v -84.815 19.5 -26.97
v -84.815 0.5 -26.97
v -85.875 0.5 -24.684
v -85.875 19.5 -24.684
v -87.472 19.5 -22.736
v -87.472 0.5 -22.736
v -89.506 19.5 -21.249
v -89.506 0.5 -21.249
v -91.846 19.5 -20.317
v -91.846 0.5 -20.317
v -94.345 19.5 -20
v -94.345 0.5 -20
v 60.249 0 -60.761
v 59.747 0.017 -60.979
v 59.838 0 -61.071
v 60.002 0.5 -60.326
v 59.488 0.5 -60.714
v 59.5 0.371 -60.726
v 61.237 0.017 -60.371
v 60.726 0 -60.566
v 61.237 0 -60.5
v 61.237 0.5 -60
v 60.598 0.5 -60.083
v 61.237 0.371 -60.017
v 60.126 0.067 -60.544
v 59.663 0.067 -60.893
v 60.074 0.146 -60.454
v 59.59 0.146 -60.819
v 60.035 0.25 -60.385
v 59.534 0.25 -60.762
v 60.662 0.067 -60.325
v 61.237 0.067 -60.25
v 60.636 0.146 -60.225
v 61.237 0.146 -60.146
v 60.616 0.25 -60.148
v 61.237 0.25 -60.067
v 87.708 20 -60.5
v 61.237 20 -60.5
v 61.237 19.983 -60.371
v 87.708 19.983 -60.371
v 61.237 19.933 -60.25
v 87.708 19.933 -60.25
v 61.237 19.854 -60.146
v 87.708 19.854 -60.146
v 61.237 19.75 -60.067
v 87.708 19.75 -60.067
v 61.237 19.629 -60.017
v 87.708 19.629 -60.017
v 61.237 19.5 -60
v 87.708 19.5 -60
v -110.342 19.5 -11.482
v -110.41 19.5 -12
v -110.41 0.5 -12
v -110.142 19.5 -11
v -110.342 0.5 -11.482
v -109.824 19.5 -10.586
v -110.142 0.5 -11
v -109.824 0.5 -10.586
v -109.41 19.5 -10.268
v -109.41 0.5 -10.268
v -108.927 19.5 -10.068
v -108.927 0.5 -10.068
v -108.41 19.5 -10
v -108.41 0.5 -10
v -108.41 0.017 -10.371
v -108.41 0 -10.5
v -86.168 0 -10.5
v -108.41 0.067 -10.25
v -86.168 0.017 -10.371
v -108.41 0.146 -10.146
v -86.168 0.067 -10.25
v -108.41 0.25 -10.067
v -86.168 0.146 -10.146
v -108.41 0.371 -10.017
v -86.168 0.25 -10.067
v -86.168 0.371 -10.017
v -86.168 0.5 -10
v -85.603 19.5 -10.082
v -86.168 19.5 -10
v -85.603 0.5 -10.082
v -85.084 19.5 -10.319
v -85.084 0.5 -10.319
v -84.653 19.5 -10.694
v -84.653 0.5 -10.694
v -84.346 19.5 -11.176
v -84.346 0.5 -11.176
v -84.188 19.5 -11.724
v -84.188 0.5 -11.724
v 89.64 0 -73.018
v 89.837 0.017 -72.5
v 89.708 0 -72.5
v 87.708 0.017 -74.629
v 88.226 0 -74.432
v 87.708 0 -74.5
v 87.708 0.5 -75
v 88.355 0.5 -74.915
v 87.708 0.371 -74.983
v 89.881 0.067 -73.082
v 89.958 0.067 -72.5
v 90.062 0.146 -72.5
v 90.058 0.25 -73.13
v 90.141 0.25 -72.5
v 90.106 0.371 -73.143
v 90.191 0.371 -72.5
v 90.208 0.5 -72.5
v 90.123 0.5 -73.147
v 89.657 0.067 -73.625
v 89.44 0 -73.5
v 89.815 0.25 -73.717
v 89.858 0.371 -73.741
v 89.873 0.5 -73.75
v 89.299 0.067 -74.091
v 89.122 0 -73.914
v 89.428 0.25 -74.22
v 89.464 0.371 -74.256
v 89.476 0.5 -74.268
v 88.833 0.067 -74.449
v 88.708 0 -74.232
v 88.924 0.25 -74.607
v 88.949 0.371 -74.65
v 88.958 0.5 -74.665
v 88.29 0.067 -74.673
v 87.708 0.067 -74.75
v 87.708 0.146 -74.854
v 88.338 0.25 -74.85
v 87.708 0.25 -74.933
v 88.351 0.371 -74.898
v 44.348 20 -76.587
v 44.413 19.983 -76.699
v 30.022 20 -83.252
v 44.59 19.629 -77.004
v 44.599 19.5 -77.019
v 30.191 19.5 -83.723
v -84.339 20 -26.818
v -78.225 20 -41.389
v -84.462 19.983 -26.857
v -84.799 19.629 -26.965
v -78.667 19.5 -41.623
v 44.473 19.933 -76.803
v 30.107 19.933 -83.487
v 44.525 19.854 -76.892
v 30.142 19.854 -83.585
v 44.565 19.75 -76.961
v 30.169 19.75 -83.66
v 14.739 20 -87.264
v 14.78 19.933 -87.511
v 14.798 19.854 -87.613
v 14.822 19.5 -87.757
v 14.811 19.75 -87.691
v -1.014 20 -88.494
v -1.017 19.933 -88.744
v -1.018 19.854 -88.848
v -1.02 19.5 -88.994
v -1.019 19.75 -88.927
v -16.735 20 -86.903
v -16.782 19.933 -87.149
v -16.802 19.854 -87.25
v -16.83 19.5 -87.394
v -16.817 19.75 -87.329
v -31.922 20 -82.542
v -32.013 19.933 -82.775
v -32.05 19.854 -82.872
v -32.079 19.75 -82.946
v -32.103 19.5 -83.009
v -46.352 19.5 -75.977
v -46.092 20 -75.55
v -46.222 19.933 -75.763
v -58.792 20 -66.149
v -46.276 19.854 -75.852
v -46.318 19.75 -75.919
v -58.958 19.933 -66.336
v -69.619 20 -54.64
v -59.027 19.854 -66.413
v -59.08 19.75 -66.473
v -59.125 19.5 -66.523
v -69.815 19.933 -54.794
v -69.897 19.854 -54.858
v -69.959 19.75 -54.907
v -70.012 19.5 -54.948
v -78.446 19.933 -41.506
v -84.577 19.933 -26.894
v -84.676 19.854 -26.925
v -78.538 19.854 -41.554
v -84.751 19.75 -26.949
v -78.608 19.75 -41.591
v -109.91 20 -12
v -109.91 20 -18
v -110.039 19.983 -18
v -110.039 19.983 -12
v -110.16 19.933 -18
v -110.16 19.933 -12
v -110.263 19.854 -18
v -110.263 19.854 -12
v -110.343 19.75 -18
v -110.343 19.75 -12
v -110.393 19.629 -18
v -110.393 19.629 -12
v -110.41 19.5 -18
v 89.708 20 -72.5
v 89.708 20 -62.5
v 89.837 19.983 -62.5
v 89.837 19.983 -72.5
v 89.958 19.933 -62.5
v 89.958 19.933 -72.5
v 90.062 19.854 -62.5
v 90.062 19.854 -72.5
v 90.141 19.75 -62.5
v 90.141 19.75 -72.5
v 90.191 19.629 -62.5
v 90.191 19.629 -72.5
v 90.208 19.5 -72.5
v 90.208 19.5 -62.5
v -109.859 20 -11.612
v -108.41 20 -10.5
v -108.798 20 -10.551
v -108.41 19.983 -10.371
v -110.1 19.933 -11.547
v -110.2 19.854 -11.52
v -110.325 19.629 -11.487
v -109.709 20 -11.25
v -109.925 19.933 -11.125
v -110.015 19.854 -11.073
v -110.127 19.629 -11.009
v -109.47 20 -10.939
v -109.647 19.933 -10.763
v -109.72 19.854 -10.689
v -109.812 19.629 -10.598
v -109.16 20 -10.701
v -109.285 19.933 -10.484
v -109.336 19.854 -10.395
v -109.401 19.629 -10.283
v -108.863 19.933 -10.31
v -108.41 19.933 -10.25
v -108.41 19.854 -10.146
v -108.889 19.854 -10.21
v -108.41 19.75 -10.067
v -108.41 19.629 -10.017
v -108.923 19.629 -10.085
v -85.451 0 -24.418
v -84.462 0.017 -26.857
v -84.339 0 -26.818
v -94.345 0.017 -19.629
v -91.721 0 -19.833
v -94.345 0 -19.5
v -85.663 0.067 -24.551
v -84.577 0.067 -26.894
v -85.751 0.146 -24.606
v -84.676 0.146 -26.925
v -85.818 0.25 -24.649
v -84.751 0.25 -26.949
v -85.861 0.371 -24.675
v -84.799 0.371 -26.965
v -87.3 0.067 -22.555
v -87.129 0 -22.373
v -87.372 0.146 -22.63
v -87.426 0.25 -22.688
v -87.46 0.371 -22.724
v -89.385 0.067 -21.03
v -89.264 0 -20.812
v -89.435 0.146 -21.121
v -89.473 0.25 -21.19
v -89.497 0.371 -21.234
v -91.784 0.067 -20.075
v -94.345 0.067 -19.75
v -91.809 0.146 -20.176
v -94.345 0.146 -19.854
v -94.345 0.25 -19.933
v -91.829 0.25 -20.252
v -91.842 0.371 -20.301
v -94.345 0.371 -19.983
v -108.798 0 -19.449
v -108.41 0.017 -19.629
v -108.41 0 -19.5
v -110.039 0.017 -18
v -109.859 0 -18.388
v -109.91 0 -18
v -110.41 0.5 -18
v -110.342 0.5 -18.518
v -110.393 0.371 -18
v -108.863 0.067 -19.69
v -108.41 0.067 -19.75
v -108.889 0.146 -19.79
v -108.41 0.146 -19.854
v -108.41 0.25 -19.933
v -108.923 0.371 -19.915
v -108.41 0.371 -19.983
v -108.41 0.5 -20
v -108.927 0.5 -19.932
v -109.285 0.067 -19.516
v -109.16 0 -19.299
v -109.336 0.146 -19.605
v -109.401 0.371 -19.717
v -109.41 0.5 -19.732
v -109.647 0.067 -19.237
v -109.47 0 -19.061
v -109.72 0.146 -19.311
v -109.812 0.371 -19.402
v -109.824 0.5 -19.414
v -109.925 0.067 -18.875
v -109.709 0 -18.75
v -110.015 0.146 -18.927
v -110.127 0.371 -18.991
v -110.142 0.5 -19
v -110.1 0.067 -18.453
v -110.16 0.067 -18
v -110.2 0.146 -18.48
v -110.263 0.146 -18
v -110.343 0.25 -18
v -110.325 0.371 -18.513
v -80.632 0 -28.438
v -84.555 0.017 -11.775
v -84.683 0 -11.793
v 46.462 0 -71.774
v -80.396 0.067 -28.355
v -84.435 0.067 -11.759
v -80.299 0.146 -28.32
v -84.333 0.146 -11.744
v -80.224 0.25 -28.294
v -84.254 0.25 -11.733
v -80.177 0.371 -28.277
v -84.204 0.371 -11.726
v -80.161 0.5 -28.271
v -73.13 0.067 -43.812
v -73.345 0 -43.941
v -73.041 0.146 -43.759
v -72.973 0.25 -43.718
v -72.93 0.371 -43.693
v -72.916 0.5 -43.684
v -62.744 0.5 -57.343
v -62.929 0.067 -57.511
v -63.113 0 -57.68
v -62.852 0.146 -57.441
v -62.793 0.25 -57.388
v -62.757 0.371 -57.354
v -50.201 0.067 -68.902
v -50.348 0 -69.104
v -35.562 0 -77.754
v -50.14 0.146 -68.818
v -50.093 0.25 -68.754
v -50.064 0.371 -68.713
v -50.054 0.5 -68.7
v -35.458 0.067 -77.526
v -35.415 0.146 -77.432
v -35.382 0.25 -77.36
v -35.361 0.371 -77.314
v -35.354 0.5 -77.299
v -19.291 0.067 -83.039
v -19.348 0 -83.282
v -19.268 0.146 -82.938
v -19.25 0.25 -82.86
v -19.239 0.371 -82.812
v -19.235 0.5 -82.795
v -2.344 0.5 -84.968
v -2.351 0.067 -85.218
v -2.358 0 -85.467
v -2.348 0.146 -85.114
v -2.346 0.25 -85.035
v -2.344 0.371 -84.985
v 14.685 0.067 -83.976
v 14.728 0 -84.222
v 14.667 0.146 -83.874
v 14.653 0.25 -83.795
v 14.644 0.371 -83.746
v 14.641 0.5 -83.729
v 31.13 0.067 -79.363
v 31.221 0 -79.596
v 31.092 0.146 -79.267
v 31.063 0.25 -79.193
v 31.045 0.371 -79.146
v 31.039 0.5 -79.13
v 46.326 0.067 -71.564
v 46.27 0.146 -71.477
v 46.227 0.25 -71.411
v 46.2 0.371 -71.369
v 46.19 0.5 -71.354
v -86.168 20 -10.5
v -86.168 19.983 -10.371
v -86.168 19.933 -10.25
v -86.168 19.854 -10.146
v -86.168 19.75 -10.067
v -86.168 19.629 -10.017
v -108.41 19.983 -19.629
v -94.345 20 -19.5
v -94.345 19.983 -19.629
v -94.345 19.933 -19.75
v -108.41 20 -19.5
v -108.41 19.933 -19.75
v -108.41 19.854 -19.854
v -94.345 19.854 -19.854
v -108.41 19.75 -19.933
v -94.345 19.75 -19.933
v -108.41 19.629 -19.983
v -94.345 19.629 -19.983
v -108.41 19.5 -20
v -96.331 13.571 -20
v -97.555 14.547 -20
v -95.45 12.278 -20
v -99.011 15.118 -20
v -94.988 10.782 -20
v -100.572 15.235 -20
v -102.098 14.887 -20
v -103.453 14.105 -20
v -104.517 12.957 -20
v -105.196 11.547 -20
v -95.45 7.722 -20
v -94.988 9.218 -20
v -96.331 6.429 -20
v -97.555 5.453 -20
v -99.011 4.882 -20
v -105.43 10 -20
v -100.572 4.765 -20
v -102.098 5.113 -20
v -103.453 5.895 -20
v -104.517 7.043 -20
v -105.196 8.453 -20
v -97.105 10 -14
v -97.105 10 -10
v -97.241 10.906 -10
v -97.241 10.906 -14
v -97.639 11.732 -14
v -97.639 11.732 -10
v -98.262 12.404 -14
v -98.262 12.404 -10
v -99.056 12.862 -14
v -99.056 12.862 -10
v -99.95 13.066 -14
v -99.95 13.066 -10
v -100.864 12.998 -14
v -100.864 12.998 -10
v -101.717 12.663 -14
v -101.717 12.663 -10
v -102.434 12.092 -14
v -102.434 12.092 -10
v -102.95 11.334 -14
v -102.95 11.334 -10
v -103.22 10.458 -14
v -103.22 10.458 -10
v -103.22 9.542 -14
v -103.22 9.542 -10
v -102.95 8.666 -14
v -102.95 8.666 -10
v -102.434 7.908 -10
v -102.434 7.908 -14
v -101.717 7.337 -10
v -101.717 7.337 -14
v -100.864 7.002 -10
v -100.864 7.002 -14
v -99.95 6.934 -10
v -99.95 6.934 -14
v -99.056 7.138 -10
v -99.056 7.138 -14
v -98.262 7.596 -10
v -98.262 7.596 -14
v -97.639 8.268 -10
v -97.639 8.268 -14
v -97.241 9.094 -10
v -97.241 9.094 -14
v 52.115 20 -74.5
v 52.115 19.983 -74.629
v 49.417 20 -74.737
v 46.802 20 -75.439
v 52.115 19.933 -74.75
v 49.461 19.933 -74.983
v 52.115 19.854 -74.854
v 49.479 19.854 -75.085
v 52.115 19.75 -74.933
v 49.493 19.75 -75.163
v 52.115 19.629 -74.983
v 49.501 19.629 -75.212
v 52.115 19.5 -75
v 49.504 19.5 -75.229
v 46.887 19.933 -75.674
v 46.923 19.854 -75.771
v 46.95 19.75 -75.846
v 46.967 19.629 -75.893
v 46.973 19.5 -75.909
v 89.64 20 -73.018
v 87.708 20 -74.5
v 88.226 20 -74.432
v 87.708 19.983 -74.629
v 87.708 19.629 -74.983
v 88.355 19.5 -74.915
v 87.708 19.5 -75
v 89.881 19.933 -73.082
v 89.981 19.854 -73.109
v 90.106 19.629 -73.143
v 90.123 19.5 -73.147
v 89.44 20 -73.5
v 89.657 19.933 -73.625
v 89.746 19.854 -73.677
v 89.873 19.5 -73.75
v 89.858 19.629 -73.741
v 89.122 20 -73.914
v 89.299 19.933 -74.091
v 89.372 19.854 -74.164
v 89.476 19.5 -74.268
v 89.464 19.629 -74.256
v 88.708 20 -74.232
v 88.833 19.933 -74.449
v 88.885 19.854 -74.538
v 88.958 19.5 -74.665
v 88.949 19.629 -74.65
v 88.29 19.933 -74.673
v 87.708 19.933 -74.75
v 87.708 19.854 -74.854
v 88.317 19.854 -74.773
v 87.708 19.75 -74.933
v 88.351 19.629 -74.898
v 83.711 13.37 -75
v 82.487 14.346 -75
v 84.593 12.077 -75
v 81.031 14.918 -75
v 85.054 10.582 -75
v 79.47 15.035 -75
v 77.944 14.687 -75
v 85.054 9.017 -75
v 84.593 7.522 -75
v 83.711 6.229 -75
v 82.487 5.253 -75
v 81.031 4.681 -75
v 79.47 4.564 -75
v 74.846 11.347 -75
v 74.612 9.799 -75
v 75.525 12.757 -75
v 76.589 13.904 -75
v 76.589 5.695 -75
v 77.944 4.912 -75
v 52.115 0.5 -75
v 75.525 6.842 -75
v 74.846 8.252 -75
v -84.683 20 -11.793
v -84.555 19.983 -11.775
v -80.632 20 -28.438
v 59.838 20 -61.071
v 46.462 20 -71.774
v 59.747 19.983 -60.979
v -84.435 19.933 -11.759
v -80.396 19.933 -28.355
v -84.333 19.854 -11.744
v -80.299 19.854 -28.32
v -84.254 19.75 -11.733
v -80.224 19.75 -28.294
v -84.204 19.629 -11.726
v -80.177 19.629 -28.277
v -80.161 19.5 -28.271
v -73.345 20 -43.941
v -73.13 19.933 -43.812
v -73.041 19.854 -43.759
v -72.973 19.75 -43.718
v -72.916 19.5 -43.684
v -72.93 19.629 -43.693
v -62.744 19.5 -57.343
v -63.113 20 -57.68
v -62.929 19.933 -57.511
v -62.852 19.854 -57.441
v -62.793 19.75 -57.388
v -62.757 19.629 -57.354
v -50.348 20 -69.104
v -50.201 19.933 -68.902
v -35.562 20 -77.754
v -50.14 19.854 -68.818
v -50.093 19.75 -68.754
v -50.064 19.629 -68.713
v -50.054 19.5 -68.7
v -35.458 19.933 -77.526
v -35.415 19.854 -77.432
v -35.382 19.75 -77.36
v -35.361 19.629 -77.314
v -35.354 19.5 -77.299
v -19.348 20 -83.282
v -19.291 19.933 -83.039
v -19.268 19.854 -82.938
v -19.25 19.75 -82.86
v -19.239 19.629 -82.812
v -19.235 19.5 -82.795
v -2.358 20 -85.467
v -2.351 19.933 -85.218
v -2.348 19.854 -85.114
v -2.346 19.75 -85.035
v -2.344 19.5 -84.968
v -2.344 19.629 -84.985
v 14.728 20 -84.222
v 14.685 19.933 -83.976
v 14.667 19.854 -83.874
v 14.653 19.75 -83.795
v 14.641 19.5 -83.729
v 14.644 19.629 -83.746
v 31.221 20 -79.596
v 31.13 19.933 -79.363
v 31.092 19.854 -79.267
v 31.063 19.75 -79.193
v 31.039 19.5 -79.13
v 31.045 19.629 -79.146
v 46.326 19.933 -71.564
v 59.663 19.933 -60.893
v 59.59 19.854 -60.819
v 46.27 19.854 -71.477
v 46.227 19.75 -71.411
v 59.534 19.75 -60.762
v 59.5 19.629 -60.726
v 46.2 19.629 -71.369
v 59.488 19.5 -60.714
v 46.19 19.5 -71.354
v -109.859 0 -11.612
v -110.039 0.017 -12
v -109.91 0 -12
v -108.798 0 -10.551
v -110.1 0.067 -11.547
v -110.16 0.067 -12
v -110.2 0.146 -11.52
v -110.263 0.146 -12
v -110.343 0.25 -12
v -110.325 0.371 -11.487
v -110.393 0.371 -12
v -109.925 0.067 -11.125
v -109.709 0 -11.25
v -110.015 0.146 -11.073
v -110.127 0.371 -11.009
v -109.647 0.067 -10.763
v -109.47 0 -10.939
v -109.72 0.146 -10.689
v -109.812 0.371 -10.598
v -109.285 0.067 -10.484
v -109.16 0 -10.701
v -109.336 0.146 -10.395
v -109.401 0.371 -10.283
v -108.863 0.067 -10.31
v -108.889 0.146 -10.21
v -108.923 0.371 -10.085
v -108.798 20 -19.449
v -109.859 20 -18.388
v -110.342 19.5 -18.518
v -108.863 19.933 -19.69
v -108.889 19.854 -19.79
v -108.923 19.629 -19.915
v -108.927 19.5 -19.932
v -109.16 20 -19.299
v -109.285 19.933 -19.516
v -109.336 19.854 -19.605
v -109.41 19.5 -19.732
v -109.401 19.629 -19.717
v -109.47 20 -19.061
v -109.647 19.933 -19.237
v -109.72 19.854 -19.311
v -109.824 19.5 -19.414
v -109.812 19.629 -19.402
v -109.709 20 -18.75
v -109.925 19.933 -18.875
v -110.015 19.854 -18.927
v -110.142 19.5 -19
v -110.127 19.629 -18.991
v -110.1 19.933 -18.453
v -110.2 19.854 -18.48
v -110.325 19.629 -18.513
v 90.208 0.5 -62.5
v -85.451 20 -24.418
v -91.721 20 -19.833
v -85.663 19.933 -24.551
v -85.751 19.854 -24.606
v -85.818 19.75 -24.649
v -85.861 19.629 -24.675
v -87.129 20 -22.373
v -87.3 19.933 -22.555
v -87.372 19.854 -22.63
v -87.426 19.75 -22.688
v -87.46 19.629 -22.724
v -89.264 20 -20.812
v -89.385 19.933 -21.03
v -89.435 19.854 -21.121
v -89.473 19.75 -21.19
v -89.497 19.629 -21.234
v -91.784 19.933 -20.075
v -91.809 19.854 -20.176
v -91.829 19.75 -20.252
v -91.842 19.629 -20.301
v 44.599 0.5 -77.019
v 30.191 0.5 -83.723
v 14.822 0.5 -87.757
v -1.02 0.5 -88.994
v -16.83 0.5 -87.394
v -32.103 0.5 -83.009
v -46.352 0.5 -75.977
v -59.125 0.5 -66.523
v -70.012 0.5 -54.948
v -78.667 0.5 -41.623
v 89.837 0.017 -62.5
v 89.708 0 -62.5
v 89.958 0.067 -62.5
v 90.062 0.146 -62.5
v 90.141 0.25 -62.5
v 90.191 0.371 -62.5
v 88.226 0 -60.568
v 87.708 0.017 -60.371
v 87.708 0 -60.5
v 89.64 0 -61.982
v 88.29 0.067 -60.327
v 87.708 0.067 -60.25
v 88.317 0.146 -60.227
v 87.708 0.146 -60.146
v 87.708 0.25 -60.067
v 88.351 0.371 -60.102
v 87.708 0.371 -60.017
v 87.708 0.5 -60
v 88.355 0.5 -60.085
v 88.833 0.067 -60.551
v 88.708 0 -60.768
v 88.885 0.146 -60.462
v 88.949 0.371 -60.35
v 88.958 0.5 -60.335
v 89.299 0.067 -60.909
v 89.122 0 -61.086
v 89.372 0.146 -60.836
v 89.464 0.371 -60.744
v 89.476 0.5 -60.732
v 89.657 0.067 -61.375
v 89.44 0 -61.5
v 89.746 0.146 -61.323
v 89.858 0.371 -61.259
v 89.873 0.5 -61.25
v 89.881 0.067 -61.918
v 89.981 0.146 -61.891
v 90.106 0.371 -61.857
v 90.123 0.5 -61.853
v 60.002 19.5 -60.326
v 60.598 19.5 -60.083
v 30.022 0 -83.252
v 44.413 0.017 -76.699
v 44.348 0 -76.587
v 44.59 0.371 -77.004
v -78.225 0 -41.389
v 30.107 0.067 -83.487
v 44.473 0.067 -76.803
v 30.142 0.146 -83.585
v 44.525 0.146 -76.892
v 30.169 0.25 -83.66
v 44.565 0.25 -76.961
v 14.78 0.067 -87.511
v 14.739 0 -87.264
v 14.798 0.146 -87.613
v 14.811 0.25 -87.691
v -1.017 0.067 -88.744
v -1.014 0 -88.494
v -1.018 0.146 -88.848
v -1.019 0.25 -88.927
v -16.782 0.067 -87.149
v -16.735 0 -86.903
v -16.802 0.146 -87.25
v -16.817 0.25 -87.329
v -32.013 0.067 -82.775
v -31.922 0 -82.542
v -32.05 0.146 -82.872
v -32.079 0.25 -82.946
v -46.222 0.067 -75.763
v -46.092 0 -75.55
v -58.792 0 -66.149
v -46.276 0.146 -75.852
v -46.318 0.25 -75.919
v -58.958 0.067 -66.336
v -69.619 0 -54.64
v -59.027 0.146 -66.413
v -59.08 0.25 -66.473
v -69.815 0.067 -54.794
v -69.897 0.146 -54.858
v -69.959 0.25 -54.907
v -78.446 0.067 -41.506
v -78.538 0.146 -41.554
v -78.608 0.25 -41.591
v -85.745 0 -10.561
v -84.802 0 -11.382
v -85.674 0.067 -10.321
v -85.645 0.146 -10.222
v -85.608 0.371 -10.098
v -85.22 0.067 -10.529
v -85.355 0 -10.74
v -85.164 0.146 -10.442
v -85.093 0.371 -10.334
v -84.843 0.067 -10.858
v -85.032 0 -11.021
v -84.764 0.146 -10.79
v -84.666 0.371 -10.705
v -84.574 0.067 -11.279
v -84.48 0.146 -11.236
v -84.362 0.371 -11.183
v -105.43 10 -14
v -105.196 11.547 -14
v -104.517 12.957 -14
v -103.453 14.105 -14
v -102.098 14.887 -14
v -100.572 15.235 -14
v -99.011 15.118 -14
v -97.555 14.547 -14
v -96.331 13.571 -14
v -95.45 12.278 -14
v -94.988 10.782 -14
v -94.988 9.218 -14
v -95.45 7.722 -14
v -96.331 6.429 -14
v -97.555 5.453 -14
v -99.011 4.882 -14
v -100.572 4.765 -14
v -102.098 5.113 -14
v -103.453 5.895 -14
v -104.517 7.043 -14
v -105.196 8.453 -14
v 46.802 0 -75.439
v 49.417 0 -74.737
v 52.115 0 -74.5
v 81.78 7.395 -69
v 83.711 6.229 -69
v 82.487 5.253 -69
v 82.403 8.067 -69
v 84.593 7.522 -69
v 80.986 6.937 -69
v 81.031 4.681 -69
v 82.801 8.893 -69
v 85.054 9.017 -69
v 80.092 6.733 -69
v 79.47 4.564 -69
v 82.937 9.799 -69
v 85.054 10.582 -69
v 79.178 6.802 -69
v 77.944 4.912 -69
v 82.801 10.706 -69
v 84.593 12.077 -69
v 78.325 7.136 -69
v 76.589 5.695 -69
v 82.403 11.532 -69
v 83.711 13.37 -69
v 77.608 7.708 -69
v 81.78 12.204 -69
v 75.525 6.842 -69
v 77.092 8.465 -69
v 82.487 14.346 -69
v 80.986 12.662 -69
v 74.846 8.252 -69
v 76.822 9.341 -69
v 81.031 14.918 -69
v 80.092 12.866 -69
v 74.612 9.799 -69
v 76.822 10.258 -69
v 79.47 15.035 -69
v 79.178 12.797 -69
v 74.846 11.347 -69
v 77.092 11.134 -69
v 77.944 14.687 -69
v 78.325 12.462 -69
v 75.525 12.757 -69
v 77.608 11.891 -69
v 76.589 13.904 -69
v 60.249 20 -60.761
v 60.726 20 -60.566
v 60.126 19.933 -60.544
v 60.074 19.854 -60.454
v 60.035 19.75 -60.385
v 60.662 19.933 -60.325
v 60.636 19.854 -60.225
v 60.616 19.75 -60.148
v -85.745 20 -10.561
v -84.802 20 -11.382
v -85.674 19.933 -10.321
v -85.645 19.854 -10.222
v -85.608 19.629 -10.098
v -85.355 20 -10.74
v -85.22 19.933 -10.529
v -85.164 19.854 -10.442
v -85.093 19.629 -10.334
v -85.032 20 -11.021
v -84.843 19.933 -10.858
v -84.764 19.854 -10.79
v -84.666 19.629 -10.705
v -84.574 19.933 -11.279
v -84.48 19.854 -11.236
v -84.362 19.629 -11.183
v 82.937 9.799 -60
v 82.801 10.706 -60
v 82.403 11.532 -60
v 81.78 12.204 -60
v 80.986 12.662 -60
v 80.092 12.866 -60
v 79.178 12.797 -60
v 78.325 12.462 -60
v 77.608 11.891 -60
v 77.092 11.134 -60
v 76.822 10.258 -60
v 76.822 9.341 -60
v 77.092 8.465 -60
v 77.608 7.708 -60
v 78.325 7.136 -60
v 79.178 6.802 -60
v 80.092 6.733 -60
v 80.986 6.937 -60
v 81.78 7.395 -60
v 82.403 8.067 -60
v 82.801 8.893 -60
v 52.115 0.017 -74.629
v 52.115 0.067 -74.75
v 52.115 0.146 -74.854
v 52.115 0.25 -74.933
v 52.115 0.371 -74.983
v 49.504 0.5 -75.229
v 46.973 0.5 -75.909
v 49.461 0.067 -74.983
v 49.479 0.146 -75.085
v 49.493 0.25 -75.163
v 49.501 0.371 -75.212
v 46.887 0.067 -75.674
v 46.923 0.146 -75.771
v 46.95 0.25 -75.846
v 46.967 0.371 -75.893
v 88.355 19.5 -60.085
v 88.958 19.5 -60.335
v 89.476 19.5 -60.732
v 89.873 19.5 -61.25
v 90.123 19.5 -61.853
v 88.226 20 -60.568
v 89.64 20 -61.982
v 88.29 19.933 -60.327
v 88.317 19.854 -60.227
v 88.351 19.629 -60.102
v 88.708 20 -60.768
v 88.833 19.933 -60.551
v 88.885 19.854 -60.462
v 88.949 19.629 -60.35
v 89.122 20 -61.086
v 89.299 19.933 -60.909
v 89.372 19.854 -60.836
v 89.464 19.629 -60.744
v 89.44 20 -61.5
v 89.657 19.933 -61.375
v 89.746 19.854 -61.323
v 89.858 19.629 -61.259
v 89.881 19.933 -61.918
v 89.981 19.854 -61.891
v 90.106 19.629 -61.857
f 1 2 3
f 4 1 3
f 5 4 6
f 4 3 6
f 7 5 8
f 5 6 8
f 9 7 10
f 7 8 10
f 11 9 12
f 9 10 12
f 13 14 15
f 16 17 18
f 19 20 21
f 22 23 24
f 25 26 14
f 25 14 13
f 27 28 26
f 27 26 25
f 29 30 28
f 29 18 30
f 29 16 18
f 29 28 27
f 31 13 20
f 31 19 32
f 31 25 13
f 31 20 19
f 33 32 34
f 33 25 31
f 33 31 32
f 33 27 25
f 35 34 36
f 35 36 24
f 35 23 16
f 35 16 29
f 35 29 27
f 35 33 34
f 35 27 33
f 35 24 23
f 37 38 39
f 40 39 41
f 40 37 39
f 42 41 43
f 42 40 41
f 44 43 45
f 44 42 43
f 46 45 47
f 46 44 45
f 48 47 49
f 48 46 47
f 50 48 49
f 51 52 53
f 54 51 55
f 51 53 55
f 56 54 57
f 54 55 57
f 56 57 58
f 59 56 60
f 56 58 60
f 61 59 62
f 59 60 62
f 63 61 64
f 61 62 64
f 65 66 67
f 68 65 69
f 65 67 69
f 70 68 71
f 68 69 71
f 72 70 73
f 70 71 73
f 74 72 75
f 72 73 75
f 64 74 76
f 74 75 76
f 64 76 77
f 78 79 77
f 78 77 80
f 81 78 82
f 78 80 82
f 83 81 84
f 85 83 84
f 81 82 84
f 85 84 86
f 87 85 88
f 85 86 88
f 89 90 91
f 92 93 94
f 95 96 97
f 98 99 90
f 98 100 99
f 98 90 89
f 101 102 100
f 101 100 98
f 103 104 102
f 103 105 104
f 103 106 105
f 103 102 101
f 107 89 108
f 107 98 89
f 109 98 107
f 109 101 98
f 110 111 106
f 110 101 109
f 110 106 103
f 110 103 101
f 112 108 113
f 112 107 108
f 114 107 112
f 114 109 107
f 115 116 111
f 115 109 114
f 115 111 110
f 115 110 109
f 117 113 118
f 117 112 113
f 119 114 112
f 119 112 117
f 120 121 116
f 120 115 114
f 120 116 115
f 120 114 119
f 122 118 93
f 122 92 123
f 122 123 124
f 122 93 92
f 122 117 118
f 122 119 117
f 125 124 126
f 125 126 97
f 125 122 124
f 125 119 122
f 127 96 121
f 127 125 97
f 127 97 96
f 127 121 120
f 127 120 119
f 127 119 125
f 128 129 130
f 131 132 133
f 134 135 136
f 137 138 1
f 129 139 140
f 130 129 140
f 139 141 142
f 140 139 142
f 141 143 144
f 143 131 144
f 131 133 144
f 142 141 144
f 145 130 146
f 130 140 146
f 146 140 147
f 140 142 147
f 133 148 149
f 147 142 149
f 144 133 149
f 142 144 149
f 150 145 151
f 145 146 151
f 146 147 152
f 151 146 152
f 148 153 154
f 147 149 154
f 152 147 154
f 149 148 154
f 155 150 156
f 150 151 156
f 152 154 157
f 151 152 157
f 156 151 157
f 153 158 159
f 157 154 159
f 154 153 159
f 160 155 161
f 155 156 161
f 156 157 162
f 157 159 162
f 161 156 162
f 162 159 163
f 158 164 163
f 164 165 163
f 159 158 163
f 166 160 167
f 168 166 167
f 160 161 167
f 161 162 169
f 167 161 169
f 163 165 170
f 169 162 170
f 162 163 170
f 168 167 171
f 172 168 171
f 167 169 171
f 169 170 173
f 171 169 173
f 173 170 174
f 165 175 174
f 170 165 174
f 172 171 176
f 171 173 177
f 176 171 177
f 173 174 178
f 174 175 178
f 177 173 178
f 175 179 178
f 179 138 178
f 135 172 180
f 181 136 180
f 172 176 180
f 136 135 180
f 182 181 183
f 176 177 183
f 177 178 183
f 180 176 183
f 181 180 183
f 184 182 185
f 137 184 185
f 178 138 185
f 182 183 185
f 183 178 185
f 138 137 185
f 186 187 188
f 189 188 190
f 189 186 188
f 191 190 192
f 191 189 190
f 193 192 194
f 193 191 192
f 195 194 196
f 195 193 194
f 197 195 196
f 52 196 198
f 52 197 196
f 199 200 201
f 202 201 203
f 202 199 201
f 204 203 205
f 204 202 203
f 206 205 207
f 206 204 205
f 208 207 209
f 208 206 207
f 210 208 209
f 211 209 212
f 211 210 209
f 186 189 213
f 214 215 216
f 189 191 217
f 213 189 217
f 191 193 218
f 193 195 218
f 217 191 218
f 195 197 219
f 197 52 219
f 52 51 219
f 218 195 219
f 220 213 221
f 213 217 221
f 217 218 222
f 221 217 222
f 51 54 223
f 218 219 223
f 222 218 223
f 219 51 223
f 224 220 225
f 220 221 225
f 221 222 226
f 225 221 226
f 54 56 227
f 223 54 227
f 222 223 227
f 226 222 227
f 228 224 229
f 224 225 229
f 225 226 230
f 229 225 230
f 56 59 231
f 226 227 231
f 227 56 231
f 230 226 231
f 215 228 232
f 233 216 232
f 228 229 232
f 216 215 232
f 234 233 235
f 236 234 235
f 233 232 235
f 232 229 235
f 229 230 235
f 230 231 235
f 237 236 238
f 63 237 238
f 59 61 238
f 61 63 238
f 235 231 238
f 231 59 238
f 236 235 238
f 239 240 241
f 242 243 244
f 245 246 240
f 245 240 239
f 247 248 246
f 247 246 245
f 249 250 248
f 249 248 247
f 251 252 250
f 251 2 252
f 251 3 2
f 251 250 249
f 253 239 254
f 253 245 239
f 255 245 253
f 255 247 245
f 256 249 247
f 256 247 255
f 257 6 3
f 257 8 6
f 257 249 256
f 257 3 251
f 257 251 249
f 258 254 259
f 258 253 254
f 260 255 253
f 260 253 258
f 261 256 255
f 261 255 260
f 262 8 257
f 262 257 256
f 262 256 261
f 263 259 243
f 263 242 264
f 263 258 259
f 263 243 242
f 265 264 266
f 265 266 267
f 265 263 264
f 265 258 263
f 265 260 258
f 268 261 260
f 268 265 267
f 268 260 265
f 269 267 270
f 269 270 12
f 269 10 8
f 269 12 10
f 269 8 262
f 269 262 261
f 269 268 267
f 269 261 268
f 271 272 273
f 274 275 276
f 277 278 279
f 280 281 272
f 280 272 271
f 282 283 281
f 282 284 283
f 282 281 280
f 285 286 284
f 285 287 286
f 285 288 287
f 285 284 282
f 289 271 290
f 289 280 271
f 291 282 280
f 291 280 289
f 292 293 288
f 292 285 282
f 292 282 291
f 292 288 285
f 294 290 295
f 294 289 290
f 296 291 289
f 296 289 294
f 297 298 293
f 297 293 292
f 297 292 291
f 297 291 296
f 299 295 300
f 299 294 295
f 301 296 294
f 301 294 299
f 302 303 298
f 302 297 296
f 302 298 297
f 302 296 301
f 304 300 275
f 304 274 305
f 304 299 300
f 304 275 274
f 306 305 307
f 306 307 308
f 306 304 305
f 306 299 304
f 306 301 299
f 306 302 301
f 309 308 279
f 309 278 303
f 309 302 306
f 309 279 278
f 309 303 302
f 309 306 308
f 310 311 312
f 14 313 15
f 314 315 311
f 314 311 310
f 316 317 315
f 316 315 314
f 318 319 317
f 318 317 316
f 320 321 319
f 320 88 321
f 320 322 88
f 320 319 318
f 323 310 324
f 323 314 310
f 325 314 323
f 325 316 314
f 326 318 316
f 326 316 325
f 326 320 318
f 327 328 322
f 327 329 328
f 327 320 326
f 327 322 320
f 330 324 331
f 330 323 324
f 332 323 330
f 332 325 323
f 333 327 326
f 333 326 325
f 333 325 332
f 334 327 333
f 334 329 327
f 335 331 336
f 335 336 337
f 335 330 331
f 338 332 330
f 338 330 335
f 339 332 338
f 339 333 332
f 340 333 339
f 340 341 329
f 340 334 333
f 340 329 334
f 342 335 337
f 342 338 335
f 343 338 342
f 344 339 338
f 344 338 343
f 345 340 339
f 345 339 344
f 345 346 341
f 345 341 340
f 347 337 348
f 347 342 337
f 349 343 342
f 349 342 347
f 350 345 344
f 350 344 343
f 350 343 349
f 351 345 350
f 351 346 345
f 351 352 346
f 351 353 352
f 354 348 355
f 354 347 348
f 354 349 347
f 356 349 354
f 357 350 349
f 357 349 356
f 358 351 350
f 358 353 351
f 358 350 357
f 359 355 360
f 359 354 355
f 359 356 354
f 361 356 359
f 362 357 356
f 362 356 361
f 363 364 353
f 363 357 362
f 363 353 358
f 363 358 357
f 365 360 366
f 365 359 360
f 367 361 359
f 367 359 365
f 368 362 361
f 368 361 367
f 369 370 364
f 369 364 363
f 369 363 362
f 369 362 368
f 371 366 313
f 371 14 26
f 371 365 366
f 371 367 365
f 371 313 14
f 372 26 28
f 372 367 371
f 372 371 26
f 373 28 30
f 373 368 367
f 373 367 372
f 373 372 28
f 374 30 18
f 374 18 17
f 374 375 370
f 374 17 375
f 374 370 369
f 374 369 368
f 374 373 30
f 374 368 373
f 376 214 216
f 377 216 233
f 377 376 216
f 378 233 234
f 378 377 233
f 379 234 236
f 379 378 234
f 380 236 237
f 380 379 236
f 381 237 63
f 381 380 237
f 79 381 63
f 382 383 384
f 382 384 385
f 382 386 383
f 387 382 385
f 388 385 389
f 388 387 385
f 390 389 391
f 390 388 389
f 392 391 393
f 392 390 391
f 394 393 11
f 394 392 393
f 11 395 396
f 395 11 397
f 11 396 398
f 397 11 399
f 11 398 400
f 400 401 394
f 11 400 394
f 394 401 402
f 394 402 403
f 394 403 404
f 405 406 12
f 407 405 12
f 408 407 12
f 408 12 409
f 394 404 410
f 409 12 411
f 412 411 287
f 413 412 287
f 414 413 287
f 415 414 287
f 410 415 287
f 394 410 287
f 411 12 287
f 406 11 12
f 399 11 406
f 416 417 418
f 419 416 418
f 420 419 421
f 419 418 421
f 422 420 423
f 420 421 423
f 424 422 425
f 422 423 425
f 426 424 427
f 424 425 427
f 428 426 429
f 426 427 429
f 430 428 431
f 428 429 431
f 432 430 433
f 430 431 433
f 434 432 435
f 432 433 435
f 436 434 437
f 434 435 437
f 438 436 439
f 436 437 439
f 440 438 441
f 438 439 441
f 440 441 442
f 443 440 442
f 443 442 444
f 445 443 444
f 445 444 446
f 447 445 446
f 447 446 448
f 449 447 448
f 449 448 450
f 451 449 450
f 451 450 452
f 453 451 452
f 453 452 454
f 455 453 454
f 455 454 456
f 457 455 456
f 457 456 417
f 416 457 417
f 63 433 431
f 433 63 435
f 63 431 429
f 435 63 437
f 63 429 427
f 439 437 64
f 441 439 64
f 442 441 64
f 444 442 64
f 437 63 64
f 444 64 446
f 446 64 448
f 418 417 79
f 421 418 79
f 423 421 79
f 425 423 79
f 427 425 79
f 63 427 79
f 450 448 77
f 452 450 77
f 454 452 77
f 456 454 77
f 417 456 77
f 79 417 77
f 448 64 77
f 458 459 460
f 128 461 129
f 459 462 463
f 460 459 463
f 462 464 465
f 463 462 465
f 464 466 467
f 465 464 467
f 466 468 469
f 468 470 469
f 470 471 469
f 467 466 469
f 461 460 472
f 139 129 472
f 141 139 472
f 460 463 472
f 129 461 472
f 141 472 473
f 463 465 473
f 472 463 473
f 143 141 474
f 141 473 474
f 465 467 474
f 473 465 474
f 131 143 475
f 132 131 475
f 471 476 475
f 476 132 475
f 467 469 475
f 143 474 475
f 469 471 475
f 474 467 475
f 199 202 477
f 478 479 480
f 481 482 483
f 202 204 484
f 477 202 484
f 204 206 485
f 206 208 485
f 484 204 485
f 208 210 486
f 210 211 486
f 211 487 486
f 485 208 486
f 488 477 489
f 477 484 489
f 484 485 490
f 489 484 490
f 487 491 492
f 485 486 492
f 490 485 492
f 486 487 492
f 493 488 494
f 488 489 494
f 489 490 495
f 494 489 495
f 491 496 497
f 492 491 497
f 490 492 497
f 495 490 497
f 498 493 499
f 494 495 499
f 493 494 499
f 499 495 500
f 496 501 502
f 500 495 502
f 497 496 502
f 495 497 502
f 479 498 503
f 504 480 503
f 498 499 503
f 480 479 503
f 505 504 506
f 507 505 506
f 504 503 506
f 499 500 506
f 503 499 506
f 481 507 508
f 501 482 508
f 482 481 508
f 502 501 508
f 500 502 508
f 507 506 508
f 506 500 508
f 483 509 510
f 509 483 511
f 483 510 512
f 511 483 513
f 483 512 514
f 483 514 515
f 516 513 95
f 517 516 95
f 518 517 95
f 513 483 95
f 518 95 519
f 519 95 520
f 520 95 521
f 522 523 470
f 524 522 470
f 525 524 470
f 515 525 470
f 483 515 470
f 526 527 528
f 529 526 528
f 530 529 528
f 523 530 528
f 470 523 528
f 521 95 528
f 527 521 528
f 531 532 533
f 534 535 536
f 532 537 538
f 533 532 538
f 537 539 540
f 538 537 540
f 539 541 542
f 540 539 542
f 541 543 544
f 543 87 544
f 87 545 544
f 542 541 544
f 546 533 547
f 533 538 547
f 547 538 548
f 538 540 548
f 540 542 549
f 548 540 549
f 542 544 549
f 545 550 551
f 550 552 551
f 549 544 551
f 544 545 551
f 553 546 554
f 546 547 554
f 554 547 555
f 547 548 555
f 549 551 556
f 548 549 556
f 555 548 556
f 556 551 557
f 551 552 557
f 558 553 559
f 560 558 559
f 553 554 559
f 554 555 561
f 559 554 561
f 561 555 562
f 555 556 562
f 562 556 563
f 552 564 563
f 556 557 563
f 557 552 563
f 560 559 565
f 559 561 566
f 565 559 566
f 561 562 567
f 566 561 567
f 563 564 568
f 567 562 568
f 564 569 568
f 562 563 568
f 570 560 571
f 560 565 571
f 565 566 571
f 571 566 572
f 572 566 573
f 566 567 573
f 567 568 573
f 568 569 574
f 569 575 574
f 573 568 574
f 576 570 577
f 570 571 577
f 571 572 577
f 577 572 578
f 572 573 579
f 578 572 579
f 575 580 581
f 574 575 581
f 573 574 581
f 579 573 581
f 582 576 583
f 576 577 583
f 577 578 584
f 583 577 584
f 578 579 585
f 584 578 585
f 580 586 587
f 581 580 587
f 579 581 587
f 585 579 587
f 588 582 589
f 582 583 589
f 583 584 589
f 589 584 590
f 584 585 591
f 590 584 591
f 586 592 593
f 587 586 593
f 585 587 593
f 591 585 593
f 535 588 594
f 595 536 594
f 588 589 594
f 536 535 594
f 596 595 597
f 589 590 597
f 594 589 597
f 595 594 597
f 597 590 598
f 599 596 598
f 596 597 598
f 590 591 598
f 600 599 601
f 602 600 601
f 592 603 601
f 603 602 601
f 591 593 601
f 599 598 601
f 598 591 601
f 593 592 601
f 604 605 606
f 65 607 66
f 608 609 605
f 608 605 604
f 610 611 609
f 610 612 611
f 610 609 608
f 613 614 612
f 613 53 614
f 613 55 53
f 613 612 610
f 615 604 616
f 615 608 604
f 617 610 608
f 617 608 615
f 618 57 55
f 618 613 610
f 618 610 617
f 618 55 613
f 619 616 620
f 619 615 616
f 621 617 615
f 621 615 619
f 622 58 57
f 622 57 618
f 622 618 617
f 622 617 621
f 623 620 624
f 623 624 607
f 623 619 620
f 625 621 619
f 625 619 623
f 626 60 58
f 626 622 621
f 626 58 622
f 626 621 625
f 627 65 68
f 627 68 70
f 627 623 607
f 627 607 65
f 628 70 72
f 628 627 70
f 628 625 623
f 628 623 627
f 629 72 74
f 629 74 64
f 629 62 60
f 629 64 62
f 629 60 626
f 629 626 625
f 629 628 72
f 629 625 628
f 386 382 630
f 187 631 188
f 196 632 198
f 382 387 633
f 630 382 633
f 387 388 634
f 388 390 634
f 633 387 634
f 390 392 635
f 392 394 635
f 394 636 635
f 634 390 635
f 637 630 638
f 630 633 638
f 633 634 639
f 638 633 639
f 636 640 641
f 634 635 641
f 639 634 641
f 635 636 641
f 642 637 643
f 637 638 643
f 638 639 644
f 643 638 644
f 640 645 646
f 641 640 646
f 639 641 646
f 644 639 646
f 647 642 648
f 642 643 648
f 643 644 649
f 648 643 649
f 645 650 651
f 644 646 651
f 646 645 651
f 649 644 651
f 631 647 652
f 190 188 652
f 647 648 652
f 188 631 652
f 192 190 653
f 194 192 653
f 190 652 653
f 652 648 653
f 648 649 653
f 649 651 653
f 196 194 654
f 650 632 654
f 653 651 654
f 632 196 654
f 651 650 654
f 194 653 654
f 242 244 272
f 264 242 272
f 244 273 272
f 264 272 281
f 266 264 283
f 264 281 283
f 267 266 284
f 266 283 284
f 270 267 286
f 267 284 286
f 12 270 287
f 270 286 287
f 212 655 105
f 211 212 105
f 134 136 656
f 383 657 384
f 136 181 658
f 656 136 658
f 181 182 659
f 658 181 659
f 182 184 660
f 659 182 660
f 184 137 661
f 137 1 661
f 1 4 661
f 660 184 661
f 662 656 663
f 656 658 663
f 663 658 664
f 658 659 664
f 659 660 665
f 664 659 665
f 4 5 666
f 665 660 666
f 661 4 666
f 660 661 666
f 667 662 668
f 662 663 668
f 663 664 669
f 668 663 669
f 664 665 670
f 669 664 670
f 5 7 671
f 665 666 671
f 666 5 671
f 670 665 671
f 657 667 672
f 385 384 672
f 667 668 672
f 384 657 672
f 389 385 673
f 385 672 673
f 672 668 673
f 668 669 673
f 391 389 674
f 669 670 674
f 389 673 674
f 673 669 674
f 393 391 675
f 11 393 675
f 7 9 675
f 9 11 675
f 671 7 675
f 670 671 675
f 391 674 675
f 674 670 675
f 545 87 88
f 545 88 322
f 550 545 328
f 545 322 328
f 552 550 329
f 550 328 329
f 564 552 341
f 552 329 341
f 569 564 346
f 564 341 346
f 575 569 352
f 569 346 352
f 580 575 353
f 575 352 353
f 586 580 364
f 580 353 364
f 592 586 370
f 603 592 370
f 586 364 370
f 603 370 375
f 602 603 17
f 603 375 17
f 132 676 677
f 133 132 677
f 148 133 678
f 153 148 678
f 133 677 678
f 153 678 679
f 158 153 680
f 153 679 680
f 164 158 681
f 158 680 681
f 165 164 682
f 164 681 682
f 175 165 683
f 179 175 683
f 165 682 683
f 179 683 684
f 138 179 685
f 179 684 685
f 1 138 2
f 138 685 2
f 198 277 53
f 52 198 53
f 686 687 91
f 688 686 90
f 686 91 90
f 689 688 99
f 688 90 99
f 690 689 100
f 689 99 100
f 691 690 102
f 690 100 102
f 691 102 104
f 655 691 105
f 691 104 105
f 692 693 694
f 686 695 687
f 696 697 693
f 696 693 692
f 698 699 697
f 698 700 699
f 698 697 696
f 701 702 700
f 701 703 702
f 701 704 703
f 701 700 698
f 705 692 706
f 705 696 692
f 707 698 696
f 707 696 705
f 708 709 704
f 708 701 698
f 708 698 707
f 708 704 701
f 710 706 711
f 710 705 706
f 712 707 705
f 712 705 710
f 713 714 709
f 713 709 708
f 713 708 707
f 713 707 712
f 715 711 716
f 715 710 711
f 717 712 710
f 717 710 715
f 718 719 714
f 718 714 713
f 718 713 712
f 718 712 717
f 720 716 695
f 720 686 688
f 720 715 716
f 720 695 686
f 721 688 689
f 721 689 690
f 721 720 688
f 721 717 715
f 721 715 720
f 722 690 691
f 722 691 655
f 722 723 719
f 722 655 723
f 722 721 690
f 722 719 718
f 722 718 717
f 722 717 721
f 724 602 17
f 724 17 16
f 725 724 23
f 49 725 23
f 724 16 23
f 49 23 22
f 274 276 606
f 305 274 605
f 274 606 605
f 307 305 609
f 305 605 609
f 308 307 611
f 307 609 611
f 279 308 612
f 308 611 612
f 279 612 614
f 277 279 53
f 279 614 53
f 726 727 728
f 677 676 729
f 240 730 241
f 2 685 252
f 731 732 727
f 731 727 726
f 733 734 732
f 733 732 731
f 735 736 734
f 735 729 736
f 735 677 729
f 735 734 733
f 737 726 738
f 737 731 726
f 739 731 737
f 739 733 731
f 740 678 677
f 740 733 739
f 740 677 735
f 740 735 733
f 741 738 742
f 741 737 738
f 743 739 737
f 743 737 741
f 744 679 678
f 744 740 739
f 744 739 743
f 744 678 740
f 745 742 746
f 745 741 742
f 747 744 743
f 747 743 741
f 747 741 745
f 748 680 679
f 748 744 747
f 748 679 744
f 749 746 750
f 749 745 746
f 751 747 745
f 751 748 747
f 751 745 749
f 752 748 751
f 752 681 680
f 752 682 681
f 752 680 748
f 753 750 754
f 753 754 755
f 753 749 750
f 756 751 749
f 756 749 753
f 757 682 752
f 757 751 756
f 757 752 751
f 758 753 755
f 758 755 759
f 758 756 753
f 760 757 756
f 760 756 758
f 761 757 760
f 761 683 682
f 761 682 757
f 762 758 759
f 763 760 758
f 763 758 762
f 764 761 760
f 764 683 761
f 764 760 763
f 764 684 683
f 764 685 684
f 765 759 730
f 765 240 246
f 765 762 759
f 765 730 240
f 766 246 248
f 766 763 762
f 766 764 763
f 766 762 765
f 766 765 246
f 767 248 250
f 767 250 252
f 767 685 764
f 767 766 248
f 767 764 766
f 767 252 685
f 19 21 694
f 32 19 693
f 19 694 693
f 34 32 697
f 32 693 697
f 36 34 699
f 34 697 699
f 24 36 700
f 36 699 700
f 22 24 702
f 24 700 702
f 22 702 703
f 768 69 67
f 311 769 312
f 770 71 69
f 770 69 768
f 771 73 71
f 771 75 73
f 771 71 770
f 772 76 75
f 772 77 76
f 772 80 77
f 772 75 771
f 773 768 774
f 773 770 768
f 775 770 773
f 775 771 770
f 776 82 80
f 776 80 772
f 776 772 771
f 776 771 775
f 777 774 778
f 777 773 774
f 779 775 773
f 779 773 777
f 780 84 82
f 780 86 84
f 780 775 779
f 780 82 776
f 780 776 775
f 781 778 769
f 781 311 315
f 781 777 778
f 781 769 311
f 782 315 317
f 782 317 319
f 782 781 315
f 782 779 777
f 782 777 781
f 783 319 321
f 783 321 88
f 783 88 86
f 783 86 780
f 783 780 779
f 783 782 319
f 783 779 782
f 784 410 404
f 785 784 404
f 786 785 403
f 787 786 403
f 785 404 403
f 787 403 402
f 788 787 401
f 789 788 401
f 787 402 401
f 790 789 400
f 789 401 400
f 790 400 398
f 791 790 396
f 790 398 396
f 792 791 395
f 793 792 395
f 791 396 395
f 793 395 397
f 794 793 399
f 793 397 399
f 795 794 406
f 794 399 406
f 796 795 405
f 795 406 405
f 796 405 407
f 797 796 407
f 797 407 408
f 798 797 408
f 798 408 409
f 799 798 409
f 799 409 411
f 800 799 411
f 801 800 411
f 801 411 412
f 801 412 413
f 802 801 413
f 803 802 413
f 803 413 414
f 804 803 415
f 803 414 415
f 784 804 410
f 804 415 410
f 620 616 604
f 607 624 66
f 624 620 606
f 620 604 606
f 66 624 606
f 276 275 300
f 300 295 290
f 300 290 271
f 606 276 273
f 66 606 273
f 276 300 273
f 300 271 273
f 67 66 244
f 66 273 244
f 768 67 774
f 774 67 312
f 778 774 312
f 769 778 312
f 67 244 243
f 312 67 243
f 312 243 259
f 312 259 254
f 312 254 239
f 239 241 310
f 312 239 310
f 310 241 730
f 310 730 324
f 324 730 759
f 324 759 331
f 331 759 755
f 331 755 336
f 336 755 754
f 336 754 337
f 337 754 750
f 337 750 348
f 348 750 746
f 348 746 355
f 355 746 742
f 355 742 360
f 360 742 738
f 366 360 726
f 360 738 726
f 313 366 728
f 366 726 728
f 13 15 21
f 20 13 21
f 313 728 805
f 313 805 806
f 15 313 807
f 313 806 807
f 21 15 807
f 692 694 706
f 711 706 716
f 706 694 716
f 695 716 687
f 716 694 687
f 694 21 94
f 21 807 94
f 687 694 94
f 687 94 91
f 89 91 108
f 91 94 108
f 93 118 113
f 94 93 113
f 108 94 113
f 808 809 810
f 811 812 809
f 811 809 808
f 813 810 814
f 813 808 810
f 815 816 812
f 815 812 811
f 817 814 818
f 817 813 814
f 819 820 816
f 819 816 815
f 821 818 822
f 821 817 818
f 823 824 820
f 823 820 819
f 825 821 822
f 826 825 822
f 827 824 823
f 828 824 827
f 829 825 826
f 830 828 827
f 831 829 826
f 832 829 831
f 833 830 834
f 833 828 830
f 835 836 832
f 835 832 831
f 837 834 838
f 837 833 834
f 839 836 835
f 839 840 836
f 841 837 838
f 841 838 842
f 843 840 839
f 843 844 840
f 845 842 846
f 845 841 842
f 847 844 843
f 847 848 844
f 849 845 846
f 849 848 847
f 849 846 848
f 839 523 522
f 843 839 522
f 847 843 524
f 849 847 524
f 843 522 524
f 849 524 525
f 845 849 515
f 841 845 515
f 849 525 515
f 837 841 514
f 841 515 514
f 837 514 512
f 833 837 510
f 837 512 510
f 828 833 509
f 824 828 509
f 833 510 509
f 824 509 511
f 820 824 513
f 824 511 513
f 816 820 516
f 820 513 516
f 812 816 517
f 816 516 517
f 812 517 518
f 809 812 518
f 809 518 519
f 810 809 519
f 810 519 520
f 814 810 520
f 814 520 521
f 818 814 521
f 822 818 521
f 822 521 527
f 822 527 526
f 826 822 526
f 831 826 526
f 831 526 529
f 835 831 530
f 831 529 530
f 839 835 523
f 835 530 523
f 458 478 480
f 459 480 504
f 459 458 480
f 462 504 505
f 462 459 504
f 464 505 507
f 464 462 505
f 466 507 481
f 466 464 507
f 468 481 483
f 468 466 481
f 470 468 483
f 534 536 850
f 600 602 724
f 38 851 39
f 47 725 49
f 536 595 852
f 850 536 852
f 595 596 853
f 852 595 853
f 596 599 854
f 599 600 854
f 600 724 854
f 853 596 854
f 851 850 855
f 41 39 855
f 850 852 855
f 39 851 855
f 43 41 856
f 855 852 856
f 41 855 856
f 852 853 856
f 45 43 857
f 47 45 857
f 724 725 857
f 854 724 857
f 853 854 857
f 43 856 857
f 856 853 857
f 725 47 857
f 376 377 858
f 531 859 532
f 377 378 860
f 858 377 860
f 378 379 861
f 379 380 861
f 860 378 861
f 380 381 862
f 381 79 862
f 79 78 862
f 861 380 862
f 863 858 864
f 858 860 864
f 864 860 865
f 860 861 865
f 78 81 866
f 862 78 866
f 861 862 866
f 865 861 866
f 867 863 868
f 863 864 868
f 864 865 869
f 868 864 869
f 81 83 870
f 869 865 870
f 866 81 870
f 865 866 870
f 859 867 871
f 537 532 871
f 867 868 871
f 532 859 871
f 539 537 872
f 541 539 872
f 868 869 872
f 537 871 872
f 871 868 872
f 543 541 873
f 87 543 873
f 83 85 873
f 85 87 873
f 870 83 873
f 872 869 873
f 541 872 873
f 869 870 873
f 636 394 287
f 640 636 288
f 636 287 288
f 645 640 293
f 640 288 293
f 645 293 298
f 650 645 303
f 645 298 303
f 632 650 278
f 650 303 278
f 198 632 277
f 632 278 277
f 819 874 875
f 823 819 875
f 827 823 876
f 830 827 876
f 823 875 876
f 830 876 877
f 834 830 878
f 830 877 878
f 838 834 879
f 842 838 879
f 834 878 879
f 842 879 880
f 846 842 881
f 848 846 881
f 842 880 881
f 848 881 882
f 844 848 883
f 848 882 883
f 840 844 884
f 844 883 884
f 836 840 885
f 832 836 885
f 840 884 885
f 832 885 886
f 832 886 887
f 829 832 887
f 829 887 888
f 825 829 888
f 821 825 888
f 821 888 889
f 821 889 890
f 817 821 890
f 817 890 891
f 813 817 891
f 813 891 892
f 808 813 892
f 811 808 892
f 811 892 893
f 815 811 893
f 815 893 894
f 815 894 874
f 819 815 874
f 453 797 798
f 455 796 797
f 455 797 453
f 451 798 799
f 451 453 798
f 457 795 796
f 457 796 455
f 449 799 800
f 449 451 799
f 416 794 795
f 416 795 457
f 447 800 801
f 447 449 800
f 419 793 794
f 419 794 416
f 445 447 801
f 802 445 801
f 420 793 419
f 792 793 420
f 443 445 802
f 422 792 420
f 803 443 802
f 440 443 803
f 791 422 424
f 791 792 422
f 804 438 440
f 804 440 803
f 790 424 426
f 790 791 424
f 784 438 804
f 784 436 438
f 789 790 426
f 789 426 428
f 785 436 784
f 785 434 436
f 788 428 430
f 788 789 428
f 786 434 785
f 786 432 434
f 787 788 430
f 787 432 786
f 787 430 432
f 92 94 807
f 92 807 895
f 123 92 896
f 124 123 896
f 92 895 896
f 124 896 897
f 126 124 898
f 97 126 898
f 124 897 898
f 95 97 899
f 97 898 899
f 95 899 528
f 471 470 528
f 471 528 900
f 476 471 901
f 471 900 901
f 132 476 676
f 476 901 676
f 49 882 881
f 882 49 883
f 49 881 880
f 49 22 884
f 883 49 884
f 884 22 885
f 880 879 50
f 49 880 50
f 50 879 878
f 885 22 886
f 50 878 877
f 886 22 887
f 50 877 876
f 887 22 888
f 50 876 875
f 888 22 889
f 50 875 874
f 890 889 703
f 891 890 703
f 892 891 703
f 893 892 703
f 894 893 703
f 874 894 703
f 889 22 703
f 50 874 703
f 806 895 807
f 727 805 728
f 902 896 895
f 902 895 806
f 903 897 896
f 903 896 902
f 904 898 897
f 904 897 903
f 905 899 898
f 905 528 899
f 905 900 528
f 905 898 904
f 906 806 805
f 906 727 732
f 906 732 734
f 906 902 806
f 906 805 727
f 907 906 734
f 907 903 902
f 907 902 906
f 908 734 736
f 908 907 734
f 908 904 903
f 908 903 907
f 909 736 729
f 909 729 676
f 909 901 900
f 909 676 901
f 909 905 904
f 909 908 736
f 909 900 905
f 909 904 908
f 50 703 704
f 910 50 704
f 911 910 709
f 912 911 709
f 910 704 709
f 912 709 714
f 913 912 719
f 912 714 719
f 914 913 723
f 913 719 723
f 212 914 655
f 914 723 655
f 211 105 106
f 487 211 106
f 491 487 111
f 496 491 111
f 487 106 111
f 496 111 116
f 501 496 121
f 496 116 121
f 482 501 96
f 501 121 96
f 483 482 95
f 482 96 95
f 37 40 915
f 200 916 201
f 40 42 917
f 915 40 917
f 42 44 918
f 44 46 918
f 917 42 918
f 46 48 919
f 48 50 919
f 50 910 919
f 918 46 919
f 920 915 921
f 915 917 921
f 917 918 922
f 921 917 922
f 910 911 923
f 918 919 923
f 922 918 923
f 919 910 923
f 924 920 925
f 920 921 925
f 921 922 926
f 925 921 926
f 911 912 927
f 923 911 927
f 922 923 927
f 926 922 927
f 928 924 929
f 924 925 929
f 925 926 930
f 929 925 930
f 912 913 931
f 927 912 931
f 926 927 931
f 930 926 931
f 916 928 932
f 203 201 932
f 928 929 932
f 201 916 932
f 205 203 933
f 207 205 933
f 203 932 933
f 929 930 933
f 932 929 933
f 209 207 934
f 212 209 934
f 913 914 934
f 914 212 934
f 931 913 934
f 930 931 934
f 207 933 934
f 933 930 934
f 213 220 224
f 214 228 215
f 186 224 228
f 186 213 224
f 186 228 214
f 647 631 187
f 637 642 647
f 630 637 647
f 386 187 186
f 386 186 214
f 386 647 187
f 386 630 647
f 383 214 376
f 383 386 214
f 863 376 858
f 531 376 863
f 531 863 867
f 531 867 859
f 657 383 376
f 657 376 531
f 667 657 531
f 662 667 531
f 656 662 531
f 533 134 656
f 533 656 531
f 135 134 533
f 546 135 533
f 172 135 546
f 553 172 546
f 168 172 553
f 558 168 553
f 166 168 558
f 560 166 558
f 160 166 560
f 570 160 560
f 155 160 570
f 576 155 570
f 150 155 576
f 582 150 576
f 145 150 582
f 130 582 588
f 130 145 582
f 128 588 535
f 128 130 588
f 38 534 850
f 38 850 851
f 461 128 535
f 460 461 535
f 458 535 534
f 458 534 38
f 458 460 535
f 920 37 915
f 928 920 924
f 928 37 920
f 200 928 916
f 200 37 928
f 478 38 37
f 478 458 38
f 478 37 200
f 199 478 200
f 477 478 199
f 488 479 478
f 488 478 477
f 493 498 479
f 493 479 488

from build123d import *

# Parameters (mm, degrees)
RESSALTO_EXTRUS_O1_DEPTH   = 20
ESBO_O3_R                  = 3.075
CORTE_EXTRUS_O1_DEPTH      = 20
ESBO_O4_R                  = 5.25
CORTE_EXTRUS_O2_DEPTH      = 6
ESBO_O5_R                  = 3.075
CORTE_EXTRUS_O3_DEPTH      = 1
CORTE_EXTRUS_O3_DEPTH_BACK = 80
ESBO_O6_R                  = 5.25
CORTE_EXTRUS_O4_DEPTH      = 6
FILETE1_R                  = 0.5


with BuildPart() as part:
    # Esboço1 → Ressalto-extrusão1 (new body)
    with BuildSketch(Plane(origin=(0, 0, 0), x_dir=(1, 0, 0), z_dir=(0, 1, 0))):
        with BuildLine():
            Line((61.23724357, 60), (87.707972894, 60))
            ThreePointArc((87.707972894, 60), (89.475739847, 60.732233047), (90.207972894, 62.5))
            Line((90.207972894, 62.5), (90.207972894, 72.5))
            ThreePointArc((90.207972894, 72.5), (89.475739847, 74.267766953), (87.707972894, 75))
            Line((87.707972894, 75), (52.115256883, 75))
            ThreePointArc((52.115256883, 75), (48.223697971, 75.513600543), (44.598633294, 77.019230769))
            ThreePointArc((44.598633294, 77.019230769), (-32.102711223, 83.008529273), (-84.815301953, 26.96969697))
            ThreePointArc((-84.815301953, 26.96969697), (-88.441850634, 21.92835115), (-94.345111161, 20))
            Line((-94.345111161, 20), (-108.409715081, 20))
            ThreePointArc((-108.409715081, 20), (-109.823928643, 19.414213562), (-110.409715081, 18))
            Line((-110.409715081, 18), (-110.409715081, 12))
            ThreePointArc((-110.409715081, 12), (-109.823928643, 10.585786438), (-108.409715081, 10))
            Line((-108.409715081, 10), (-86.168439698, 10))
            ThreePointArc((-86.168439698, 10), (-84.855375369, 10.491403941), (-84.187556027, 11.724137931))
            ThreePointArc((-84.187556027, 11.724137931), (-27.432289416, 80.451659382), (59.487608039, 60.714285714))
            ThreePointArc((59.487608039, 60.714285714), (60.292332387, 60.185449751), (61.23724357, 60))
        make_face()
    extrude(amount=RESSALTO_EXTRUS_O1_DEPTH)

    # Esboço3 → Corte-extrusão1 (cut)
    with BuildSketch(Plane.XY.offset(-60)):
        with Locations((79.862425804, 9.799419725)):
            Circle(ESBO_O3_R)
    extrude(amount=-CORTE_EXTRUS_O1_DEPTH, mode=Mode.SUBTRACT)

    # Esboço4 → Corte-extrusão2 (cut)
    with BuildSketch(Plane(origin=(0, 0, -75), x_dir=(-1, 0, 0), z_dir=(0, 0, -1))):
        with Locations((-79.862425804, 9.799419725)):
            Circle(ESBO_O4_R)
    extrude(amount=-CORTE_EXTRUS_O2_DEPTH, mode=Mode.SUBTRACT)

    # Esboço5 → Corte-extrusão3 (cut, two sides)
    with BuildSketch(Plane.XY.offset(-10)) as corte_extrus_o3_sk:
        with Locations((-100.179715081, 10)):
            Circle(ESBO_O5_R)
    extrude(amount=CORTE_EXTRUS_O3_DEPTH, mode=Mode.SUBTRACT)
    extrude(corte_extrus_o3_sk.sketch, amount=-CORTE_EXTRUS_O3_DEPTH_BACK, mode=Mode.SUBTRACT)

    # Esboço6 → Corte-extrusão4 (cut)
    with BuildSketch(Plane(origin=(0, 0, -20), x_dir=(-1, 0, 0), z_dir=(0, 0, -1))):
        with Locations((100.179715081, 10)):
            Circle(ESBO_O6_R)
    extrude(amount=-CORTE_EXTRUS_O4_DEPTH, mode=Mode.SUBTRACT)

    # Filete1
    filete1_edges = [part.edges().sort_by_distance(p)[0] for p in [
        (-88.441850634, 20, -21.92835115),
        (69.911614889, 0, -75),
        (89.475739847, 0, -74.267766953),
        (90.207972894, 0, -67.5),
        (-101.377413121, 20, -20),
        (89.475739847, 0, -60.732233047),
        (74.472608232, 0, -60),
        (60.292332387, 0, -60.185449751),
        (-27.432289416, 0, -80.451659382),
        (-84.855375369, 0, -10.491403941),
        (-97.289077389, 0, -10),
        (-109.823928643, 0, -10.585786438),
        (-110.409715081, 0, -15),
        (-109.823928643, 0, -19.414213562),
        (-101.377413121, 0, -20),
        (-109.823928643, 20, -19.414213562),
        (-88.441850634, 0, -21.92835115),
        (-32.102711223, 0, -83.008529273),
        (48.223697971, 0, -75.513600543),
        (-110.409715081, 20, -15),
        (-109.823928643, 20, -10.585786438),
        (-97.289077389, 20, -10),
        (-84.855375369, 20, -10.491403941),
        (-27.432289416, 20, -80.451659382),
        (60.292332387, 20, -60.185449751),
        (74.472608232, 20, -60),
        (48.223697971, 20, -75.513600543),
        (89.475739847, 20, -60.732233047),
        (90.207972894, 20, -67.5),
        (89.475739847, 20, -74.267766953),
        (69.911614889, 20, -75),
        (-32.102711223, 20, -83.008529273),
    ]]
    fillet(filete1_edges, radius=FILETE1_R)


solid = part.part
